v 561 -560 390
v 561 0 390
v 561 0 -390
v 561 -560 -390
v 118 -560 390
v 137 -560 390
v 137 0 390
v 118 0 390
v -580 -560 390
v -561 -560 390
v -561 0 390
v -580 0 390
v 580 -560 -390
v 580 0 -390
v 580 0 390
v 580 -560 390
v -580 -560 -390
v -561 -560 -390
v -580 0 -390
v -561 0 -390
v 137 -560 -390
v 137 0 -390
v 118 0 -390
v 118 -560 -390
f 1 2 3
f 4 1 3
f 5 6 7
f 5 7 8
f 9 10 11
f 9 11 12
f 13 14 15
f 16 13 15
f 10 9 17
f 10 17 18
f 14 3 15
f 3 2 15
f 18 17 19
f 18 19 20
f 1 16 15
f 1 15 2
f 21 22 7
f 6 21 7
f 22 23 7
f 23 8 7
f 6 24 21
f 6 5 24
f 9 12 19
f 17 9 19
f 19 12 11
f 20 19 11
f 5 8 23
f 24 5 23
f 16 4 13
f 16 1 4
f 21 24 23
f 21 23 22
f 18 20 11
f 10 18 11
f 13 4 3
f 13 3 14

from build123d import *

# Parameters (mm, degrees)
F1_DEPTH = 560
F2_DEPTH = 560
F3_DEPTH = 560


with BuildPart() as f1:
    # F0 (on Front) → F1 (new body)
    with BuildSketch(Plane.XZ):
        Polygon((-580, 390), (-580, -390), (-561, -390), (-561, -330), (-561, 270), (-561, 289), (-561, 390), align=None)
    extrude(amount=F1_DEPTH)


with BuildPart() as f2:
    # F0 (on Front) → F2 (new body)
    with BuildSketch(Plane.XZ):
        Polygon((561, -330), (561, -390), (580, -390), (580, 390), (561, 390), (561, 139), (561, 120), align=None)
    extrude(amount=F2_DEPTH)


with BuildPart() as f3:
    # F0 (on Front) → F3 (new body)
    with BuildSketch(Plane.XZ):
        Polygon((118, 216), (118, -390), (137, -390), (137, -330), (137, 120), (137, 139), (137, 390), (118, 390), (118, 235), align=None)
    extrude(amount=F3_DEPTH)


solid = Compound([f1.part, f2.part, f3.part])
